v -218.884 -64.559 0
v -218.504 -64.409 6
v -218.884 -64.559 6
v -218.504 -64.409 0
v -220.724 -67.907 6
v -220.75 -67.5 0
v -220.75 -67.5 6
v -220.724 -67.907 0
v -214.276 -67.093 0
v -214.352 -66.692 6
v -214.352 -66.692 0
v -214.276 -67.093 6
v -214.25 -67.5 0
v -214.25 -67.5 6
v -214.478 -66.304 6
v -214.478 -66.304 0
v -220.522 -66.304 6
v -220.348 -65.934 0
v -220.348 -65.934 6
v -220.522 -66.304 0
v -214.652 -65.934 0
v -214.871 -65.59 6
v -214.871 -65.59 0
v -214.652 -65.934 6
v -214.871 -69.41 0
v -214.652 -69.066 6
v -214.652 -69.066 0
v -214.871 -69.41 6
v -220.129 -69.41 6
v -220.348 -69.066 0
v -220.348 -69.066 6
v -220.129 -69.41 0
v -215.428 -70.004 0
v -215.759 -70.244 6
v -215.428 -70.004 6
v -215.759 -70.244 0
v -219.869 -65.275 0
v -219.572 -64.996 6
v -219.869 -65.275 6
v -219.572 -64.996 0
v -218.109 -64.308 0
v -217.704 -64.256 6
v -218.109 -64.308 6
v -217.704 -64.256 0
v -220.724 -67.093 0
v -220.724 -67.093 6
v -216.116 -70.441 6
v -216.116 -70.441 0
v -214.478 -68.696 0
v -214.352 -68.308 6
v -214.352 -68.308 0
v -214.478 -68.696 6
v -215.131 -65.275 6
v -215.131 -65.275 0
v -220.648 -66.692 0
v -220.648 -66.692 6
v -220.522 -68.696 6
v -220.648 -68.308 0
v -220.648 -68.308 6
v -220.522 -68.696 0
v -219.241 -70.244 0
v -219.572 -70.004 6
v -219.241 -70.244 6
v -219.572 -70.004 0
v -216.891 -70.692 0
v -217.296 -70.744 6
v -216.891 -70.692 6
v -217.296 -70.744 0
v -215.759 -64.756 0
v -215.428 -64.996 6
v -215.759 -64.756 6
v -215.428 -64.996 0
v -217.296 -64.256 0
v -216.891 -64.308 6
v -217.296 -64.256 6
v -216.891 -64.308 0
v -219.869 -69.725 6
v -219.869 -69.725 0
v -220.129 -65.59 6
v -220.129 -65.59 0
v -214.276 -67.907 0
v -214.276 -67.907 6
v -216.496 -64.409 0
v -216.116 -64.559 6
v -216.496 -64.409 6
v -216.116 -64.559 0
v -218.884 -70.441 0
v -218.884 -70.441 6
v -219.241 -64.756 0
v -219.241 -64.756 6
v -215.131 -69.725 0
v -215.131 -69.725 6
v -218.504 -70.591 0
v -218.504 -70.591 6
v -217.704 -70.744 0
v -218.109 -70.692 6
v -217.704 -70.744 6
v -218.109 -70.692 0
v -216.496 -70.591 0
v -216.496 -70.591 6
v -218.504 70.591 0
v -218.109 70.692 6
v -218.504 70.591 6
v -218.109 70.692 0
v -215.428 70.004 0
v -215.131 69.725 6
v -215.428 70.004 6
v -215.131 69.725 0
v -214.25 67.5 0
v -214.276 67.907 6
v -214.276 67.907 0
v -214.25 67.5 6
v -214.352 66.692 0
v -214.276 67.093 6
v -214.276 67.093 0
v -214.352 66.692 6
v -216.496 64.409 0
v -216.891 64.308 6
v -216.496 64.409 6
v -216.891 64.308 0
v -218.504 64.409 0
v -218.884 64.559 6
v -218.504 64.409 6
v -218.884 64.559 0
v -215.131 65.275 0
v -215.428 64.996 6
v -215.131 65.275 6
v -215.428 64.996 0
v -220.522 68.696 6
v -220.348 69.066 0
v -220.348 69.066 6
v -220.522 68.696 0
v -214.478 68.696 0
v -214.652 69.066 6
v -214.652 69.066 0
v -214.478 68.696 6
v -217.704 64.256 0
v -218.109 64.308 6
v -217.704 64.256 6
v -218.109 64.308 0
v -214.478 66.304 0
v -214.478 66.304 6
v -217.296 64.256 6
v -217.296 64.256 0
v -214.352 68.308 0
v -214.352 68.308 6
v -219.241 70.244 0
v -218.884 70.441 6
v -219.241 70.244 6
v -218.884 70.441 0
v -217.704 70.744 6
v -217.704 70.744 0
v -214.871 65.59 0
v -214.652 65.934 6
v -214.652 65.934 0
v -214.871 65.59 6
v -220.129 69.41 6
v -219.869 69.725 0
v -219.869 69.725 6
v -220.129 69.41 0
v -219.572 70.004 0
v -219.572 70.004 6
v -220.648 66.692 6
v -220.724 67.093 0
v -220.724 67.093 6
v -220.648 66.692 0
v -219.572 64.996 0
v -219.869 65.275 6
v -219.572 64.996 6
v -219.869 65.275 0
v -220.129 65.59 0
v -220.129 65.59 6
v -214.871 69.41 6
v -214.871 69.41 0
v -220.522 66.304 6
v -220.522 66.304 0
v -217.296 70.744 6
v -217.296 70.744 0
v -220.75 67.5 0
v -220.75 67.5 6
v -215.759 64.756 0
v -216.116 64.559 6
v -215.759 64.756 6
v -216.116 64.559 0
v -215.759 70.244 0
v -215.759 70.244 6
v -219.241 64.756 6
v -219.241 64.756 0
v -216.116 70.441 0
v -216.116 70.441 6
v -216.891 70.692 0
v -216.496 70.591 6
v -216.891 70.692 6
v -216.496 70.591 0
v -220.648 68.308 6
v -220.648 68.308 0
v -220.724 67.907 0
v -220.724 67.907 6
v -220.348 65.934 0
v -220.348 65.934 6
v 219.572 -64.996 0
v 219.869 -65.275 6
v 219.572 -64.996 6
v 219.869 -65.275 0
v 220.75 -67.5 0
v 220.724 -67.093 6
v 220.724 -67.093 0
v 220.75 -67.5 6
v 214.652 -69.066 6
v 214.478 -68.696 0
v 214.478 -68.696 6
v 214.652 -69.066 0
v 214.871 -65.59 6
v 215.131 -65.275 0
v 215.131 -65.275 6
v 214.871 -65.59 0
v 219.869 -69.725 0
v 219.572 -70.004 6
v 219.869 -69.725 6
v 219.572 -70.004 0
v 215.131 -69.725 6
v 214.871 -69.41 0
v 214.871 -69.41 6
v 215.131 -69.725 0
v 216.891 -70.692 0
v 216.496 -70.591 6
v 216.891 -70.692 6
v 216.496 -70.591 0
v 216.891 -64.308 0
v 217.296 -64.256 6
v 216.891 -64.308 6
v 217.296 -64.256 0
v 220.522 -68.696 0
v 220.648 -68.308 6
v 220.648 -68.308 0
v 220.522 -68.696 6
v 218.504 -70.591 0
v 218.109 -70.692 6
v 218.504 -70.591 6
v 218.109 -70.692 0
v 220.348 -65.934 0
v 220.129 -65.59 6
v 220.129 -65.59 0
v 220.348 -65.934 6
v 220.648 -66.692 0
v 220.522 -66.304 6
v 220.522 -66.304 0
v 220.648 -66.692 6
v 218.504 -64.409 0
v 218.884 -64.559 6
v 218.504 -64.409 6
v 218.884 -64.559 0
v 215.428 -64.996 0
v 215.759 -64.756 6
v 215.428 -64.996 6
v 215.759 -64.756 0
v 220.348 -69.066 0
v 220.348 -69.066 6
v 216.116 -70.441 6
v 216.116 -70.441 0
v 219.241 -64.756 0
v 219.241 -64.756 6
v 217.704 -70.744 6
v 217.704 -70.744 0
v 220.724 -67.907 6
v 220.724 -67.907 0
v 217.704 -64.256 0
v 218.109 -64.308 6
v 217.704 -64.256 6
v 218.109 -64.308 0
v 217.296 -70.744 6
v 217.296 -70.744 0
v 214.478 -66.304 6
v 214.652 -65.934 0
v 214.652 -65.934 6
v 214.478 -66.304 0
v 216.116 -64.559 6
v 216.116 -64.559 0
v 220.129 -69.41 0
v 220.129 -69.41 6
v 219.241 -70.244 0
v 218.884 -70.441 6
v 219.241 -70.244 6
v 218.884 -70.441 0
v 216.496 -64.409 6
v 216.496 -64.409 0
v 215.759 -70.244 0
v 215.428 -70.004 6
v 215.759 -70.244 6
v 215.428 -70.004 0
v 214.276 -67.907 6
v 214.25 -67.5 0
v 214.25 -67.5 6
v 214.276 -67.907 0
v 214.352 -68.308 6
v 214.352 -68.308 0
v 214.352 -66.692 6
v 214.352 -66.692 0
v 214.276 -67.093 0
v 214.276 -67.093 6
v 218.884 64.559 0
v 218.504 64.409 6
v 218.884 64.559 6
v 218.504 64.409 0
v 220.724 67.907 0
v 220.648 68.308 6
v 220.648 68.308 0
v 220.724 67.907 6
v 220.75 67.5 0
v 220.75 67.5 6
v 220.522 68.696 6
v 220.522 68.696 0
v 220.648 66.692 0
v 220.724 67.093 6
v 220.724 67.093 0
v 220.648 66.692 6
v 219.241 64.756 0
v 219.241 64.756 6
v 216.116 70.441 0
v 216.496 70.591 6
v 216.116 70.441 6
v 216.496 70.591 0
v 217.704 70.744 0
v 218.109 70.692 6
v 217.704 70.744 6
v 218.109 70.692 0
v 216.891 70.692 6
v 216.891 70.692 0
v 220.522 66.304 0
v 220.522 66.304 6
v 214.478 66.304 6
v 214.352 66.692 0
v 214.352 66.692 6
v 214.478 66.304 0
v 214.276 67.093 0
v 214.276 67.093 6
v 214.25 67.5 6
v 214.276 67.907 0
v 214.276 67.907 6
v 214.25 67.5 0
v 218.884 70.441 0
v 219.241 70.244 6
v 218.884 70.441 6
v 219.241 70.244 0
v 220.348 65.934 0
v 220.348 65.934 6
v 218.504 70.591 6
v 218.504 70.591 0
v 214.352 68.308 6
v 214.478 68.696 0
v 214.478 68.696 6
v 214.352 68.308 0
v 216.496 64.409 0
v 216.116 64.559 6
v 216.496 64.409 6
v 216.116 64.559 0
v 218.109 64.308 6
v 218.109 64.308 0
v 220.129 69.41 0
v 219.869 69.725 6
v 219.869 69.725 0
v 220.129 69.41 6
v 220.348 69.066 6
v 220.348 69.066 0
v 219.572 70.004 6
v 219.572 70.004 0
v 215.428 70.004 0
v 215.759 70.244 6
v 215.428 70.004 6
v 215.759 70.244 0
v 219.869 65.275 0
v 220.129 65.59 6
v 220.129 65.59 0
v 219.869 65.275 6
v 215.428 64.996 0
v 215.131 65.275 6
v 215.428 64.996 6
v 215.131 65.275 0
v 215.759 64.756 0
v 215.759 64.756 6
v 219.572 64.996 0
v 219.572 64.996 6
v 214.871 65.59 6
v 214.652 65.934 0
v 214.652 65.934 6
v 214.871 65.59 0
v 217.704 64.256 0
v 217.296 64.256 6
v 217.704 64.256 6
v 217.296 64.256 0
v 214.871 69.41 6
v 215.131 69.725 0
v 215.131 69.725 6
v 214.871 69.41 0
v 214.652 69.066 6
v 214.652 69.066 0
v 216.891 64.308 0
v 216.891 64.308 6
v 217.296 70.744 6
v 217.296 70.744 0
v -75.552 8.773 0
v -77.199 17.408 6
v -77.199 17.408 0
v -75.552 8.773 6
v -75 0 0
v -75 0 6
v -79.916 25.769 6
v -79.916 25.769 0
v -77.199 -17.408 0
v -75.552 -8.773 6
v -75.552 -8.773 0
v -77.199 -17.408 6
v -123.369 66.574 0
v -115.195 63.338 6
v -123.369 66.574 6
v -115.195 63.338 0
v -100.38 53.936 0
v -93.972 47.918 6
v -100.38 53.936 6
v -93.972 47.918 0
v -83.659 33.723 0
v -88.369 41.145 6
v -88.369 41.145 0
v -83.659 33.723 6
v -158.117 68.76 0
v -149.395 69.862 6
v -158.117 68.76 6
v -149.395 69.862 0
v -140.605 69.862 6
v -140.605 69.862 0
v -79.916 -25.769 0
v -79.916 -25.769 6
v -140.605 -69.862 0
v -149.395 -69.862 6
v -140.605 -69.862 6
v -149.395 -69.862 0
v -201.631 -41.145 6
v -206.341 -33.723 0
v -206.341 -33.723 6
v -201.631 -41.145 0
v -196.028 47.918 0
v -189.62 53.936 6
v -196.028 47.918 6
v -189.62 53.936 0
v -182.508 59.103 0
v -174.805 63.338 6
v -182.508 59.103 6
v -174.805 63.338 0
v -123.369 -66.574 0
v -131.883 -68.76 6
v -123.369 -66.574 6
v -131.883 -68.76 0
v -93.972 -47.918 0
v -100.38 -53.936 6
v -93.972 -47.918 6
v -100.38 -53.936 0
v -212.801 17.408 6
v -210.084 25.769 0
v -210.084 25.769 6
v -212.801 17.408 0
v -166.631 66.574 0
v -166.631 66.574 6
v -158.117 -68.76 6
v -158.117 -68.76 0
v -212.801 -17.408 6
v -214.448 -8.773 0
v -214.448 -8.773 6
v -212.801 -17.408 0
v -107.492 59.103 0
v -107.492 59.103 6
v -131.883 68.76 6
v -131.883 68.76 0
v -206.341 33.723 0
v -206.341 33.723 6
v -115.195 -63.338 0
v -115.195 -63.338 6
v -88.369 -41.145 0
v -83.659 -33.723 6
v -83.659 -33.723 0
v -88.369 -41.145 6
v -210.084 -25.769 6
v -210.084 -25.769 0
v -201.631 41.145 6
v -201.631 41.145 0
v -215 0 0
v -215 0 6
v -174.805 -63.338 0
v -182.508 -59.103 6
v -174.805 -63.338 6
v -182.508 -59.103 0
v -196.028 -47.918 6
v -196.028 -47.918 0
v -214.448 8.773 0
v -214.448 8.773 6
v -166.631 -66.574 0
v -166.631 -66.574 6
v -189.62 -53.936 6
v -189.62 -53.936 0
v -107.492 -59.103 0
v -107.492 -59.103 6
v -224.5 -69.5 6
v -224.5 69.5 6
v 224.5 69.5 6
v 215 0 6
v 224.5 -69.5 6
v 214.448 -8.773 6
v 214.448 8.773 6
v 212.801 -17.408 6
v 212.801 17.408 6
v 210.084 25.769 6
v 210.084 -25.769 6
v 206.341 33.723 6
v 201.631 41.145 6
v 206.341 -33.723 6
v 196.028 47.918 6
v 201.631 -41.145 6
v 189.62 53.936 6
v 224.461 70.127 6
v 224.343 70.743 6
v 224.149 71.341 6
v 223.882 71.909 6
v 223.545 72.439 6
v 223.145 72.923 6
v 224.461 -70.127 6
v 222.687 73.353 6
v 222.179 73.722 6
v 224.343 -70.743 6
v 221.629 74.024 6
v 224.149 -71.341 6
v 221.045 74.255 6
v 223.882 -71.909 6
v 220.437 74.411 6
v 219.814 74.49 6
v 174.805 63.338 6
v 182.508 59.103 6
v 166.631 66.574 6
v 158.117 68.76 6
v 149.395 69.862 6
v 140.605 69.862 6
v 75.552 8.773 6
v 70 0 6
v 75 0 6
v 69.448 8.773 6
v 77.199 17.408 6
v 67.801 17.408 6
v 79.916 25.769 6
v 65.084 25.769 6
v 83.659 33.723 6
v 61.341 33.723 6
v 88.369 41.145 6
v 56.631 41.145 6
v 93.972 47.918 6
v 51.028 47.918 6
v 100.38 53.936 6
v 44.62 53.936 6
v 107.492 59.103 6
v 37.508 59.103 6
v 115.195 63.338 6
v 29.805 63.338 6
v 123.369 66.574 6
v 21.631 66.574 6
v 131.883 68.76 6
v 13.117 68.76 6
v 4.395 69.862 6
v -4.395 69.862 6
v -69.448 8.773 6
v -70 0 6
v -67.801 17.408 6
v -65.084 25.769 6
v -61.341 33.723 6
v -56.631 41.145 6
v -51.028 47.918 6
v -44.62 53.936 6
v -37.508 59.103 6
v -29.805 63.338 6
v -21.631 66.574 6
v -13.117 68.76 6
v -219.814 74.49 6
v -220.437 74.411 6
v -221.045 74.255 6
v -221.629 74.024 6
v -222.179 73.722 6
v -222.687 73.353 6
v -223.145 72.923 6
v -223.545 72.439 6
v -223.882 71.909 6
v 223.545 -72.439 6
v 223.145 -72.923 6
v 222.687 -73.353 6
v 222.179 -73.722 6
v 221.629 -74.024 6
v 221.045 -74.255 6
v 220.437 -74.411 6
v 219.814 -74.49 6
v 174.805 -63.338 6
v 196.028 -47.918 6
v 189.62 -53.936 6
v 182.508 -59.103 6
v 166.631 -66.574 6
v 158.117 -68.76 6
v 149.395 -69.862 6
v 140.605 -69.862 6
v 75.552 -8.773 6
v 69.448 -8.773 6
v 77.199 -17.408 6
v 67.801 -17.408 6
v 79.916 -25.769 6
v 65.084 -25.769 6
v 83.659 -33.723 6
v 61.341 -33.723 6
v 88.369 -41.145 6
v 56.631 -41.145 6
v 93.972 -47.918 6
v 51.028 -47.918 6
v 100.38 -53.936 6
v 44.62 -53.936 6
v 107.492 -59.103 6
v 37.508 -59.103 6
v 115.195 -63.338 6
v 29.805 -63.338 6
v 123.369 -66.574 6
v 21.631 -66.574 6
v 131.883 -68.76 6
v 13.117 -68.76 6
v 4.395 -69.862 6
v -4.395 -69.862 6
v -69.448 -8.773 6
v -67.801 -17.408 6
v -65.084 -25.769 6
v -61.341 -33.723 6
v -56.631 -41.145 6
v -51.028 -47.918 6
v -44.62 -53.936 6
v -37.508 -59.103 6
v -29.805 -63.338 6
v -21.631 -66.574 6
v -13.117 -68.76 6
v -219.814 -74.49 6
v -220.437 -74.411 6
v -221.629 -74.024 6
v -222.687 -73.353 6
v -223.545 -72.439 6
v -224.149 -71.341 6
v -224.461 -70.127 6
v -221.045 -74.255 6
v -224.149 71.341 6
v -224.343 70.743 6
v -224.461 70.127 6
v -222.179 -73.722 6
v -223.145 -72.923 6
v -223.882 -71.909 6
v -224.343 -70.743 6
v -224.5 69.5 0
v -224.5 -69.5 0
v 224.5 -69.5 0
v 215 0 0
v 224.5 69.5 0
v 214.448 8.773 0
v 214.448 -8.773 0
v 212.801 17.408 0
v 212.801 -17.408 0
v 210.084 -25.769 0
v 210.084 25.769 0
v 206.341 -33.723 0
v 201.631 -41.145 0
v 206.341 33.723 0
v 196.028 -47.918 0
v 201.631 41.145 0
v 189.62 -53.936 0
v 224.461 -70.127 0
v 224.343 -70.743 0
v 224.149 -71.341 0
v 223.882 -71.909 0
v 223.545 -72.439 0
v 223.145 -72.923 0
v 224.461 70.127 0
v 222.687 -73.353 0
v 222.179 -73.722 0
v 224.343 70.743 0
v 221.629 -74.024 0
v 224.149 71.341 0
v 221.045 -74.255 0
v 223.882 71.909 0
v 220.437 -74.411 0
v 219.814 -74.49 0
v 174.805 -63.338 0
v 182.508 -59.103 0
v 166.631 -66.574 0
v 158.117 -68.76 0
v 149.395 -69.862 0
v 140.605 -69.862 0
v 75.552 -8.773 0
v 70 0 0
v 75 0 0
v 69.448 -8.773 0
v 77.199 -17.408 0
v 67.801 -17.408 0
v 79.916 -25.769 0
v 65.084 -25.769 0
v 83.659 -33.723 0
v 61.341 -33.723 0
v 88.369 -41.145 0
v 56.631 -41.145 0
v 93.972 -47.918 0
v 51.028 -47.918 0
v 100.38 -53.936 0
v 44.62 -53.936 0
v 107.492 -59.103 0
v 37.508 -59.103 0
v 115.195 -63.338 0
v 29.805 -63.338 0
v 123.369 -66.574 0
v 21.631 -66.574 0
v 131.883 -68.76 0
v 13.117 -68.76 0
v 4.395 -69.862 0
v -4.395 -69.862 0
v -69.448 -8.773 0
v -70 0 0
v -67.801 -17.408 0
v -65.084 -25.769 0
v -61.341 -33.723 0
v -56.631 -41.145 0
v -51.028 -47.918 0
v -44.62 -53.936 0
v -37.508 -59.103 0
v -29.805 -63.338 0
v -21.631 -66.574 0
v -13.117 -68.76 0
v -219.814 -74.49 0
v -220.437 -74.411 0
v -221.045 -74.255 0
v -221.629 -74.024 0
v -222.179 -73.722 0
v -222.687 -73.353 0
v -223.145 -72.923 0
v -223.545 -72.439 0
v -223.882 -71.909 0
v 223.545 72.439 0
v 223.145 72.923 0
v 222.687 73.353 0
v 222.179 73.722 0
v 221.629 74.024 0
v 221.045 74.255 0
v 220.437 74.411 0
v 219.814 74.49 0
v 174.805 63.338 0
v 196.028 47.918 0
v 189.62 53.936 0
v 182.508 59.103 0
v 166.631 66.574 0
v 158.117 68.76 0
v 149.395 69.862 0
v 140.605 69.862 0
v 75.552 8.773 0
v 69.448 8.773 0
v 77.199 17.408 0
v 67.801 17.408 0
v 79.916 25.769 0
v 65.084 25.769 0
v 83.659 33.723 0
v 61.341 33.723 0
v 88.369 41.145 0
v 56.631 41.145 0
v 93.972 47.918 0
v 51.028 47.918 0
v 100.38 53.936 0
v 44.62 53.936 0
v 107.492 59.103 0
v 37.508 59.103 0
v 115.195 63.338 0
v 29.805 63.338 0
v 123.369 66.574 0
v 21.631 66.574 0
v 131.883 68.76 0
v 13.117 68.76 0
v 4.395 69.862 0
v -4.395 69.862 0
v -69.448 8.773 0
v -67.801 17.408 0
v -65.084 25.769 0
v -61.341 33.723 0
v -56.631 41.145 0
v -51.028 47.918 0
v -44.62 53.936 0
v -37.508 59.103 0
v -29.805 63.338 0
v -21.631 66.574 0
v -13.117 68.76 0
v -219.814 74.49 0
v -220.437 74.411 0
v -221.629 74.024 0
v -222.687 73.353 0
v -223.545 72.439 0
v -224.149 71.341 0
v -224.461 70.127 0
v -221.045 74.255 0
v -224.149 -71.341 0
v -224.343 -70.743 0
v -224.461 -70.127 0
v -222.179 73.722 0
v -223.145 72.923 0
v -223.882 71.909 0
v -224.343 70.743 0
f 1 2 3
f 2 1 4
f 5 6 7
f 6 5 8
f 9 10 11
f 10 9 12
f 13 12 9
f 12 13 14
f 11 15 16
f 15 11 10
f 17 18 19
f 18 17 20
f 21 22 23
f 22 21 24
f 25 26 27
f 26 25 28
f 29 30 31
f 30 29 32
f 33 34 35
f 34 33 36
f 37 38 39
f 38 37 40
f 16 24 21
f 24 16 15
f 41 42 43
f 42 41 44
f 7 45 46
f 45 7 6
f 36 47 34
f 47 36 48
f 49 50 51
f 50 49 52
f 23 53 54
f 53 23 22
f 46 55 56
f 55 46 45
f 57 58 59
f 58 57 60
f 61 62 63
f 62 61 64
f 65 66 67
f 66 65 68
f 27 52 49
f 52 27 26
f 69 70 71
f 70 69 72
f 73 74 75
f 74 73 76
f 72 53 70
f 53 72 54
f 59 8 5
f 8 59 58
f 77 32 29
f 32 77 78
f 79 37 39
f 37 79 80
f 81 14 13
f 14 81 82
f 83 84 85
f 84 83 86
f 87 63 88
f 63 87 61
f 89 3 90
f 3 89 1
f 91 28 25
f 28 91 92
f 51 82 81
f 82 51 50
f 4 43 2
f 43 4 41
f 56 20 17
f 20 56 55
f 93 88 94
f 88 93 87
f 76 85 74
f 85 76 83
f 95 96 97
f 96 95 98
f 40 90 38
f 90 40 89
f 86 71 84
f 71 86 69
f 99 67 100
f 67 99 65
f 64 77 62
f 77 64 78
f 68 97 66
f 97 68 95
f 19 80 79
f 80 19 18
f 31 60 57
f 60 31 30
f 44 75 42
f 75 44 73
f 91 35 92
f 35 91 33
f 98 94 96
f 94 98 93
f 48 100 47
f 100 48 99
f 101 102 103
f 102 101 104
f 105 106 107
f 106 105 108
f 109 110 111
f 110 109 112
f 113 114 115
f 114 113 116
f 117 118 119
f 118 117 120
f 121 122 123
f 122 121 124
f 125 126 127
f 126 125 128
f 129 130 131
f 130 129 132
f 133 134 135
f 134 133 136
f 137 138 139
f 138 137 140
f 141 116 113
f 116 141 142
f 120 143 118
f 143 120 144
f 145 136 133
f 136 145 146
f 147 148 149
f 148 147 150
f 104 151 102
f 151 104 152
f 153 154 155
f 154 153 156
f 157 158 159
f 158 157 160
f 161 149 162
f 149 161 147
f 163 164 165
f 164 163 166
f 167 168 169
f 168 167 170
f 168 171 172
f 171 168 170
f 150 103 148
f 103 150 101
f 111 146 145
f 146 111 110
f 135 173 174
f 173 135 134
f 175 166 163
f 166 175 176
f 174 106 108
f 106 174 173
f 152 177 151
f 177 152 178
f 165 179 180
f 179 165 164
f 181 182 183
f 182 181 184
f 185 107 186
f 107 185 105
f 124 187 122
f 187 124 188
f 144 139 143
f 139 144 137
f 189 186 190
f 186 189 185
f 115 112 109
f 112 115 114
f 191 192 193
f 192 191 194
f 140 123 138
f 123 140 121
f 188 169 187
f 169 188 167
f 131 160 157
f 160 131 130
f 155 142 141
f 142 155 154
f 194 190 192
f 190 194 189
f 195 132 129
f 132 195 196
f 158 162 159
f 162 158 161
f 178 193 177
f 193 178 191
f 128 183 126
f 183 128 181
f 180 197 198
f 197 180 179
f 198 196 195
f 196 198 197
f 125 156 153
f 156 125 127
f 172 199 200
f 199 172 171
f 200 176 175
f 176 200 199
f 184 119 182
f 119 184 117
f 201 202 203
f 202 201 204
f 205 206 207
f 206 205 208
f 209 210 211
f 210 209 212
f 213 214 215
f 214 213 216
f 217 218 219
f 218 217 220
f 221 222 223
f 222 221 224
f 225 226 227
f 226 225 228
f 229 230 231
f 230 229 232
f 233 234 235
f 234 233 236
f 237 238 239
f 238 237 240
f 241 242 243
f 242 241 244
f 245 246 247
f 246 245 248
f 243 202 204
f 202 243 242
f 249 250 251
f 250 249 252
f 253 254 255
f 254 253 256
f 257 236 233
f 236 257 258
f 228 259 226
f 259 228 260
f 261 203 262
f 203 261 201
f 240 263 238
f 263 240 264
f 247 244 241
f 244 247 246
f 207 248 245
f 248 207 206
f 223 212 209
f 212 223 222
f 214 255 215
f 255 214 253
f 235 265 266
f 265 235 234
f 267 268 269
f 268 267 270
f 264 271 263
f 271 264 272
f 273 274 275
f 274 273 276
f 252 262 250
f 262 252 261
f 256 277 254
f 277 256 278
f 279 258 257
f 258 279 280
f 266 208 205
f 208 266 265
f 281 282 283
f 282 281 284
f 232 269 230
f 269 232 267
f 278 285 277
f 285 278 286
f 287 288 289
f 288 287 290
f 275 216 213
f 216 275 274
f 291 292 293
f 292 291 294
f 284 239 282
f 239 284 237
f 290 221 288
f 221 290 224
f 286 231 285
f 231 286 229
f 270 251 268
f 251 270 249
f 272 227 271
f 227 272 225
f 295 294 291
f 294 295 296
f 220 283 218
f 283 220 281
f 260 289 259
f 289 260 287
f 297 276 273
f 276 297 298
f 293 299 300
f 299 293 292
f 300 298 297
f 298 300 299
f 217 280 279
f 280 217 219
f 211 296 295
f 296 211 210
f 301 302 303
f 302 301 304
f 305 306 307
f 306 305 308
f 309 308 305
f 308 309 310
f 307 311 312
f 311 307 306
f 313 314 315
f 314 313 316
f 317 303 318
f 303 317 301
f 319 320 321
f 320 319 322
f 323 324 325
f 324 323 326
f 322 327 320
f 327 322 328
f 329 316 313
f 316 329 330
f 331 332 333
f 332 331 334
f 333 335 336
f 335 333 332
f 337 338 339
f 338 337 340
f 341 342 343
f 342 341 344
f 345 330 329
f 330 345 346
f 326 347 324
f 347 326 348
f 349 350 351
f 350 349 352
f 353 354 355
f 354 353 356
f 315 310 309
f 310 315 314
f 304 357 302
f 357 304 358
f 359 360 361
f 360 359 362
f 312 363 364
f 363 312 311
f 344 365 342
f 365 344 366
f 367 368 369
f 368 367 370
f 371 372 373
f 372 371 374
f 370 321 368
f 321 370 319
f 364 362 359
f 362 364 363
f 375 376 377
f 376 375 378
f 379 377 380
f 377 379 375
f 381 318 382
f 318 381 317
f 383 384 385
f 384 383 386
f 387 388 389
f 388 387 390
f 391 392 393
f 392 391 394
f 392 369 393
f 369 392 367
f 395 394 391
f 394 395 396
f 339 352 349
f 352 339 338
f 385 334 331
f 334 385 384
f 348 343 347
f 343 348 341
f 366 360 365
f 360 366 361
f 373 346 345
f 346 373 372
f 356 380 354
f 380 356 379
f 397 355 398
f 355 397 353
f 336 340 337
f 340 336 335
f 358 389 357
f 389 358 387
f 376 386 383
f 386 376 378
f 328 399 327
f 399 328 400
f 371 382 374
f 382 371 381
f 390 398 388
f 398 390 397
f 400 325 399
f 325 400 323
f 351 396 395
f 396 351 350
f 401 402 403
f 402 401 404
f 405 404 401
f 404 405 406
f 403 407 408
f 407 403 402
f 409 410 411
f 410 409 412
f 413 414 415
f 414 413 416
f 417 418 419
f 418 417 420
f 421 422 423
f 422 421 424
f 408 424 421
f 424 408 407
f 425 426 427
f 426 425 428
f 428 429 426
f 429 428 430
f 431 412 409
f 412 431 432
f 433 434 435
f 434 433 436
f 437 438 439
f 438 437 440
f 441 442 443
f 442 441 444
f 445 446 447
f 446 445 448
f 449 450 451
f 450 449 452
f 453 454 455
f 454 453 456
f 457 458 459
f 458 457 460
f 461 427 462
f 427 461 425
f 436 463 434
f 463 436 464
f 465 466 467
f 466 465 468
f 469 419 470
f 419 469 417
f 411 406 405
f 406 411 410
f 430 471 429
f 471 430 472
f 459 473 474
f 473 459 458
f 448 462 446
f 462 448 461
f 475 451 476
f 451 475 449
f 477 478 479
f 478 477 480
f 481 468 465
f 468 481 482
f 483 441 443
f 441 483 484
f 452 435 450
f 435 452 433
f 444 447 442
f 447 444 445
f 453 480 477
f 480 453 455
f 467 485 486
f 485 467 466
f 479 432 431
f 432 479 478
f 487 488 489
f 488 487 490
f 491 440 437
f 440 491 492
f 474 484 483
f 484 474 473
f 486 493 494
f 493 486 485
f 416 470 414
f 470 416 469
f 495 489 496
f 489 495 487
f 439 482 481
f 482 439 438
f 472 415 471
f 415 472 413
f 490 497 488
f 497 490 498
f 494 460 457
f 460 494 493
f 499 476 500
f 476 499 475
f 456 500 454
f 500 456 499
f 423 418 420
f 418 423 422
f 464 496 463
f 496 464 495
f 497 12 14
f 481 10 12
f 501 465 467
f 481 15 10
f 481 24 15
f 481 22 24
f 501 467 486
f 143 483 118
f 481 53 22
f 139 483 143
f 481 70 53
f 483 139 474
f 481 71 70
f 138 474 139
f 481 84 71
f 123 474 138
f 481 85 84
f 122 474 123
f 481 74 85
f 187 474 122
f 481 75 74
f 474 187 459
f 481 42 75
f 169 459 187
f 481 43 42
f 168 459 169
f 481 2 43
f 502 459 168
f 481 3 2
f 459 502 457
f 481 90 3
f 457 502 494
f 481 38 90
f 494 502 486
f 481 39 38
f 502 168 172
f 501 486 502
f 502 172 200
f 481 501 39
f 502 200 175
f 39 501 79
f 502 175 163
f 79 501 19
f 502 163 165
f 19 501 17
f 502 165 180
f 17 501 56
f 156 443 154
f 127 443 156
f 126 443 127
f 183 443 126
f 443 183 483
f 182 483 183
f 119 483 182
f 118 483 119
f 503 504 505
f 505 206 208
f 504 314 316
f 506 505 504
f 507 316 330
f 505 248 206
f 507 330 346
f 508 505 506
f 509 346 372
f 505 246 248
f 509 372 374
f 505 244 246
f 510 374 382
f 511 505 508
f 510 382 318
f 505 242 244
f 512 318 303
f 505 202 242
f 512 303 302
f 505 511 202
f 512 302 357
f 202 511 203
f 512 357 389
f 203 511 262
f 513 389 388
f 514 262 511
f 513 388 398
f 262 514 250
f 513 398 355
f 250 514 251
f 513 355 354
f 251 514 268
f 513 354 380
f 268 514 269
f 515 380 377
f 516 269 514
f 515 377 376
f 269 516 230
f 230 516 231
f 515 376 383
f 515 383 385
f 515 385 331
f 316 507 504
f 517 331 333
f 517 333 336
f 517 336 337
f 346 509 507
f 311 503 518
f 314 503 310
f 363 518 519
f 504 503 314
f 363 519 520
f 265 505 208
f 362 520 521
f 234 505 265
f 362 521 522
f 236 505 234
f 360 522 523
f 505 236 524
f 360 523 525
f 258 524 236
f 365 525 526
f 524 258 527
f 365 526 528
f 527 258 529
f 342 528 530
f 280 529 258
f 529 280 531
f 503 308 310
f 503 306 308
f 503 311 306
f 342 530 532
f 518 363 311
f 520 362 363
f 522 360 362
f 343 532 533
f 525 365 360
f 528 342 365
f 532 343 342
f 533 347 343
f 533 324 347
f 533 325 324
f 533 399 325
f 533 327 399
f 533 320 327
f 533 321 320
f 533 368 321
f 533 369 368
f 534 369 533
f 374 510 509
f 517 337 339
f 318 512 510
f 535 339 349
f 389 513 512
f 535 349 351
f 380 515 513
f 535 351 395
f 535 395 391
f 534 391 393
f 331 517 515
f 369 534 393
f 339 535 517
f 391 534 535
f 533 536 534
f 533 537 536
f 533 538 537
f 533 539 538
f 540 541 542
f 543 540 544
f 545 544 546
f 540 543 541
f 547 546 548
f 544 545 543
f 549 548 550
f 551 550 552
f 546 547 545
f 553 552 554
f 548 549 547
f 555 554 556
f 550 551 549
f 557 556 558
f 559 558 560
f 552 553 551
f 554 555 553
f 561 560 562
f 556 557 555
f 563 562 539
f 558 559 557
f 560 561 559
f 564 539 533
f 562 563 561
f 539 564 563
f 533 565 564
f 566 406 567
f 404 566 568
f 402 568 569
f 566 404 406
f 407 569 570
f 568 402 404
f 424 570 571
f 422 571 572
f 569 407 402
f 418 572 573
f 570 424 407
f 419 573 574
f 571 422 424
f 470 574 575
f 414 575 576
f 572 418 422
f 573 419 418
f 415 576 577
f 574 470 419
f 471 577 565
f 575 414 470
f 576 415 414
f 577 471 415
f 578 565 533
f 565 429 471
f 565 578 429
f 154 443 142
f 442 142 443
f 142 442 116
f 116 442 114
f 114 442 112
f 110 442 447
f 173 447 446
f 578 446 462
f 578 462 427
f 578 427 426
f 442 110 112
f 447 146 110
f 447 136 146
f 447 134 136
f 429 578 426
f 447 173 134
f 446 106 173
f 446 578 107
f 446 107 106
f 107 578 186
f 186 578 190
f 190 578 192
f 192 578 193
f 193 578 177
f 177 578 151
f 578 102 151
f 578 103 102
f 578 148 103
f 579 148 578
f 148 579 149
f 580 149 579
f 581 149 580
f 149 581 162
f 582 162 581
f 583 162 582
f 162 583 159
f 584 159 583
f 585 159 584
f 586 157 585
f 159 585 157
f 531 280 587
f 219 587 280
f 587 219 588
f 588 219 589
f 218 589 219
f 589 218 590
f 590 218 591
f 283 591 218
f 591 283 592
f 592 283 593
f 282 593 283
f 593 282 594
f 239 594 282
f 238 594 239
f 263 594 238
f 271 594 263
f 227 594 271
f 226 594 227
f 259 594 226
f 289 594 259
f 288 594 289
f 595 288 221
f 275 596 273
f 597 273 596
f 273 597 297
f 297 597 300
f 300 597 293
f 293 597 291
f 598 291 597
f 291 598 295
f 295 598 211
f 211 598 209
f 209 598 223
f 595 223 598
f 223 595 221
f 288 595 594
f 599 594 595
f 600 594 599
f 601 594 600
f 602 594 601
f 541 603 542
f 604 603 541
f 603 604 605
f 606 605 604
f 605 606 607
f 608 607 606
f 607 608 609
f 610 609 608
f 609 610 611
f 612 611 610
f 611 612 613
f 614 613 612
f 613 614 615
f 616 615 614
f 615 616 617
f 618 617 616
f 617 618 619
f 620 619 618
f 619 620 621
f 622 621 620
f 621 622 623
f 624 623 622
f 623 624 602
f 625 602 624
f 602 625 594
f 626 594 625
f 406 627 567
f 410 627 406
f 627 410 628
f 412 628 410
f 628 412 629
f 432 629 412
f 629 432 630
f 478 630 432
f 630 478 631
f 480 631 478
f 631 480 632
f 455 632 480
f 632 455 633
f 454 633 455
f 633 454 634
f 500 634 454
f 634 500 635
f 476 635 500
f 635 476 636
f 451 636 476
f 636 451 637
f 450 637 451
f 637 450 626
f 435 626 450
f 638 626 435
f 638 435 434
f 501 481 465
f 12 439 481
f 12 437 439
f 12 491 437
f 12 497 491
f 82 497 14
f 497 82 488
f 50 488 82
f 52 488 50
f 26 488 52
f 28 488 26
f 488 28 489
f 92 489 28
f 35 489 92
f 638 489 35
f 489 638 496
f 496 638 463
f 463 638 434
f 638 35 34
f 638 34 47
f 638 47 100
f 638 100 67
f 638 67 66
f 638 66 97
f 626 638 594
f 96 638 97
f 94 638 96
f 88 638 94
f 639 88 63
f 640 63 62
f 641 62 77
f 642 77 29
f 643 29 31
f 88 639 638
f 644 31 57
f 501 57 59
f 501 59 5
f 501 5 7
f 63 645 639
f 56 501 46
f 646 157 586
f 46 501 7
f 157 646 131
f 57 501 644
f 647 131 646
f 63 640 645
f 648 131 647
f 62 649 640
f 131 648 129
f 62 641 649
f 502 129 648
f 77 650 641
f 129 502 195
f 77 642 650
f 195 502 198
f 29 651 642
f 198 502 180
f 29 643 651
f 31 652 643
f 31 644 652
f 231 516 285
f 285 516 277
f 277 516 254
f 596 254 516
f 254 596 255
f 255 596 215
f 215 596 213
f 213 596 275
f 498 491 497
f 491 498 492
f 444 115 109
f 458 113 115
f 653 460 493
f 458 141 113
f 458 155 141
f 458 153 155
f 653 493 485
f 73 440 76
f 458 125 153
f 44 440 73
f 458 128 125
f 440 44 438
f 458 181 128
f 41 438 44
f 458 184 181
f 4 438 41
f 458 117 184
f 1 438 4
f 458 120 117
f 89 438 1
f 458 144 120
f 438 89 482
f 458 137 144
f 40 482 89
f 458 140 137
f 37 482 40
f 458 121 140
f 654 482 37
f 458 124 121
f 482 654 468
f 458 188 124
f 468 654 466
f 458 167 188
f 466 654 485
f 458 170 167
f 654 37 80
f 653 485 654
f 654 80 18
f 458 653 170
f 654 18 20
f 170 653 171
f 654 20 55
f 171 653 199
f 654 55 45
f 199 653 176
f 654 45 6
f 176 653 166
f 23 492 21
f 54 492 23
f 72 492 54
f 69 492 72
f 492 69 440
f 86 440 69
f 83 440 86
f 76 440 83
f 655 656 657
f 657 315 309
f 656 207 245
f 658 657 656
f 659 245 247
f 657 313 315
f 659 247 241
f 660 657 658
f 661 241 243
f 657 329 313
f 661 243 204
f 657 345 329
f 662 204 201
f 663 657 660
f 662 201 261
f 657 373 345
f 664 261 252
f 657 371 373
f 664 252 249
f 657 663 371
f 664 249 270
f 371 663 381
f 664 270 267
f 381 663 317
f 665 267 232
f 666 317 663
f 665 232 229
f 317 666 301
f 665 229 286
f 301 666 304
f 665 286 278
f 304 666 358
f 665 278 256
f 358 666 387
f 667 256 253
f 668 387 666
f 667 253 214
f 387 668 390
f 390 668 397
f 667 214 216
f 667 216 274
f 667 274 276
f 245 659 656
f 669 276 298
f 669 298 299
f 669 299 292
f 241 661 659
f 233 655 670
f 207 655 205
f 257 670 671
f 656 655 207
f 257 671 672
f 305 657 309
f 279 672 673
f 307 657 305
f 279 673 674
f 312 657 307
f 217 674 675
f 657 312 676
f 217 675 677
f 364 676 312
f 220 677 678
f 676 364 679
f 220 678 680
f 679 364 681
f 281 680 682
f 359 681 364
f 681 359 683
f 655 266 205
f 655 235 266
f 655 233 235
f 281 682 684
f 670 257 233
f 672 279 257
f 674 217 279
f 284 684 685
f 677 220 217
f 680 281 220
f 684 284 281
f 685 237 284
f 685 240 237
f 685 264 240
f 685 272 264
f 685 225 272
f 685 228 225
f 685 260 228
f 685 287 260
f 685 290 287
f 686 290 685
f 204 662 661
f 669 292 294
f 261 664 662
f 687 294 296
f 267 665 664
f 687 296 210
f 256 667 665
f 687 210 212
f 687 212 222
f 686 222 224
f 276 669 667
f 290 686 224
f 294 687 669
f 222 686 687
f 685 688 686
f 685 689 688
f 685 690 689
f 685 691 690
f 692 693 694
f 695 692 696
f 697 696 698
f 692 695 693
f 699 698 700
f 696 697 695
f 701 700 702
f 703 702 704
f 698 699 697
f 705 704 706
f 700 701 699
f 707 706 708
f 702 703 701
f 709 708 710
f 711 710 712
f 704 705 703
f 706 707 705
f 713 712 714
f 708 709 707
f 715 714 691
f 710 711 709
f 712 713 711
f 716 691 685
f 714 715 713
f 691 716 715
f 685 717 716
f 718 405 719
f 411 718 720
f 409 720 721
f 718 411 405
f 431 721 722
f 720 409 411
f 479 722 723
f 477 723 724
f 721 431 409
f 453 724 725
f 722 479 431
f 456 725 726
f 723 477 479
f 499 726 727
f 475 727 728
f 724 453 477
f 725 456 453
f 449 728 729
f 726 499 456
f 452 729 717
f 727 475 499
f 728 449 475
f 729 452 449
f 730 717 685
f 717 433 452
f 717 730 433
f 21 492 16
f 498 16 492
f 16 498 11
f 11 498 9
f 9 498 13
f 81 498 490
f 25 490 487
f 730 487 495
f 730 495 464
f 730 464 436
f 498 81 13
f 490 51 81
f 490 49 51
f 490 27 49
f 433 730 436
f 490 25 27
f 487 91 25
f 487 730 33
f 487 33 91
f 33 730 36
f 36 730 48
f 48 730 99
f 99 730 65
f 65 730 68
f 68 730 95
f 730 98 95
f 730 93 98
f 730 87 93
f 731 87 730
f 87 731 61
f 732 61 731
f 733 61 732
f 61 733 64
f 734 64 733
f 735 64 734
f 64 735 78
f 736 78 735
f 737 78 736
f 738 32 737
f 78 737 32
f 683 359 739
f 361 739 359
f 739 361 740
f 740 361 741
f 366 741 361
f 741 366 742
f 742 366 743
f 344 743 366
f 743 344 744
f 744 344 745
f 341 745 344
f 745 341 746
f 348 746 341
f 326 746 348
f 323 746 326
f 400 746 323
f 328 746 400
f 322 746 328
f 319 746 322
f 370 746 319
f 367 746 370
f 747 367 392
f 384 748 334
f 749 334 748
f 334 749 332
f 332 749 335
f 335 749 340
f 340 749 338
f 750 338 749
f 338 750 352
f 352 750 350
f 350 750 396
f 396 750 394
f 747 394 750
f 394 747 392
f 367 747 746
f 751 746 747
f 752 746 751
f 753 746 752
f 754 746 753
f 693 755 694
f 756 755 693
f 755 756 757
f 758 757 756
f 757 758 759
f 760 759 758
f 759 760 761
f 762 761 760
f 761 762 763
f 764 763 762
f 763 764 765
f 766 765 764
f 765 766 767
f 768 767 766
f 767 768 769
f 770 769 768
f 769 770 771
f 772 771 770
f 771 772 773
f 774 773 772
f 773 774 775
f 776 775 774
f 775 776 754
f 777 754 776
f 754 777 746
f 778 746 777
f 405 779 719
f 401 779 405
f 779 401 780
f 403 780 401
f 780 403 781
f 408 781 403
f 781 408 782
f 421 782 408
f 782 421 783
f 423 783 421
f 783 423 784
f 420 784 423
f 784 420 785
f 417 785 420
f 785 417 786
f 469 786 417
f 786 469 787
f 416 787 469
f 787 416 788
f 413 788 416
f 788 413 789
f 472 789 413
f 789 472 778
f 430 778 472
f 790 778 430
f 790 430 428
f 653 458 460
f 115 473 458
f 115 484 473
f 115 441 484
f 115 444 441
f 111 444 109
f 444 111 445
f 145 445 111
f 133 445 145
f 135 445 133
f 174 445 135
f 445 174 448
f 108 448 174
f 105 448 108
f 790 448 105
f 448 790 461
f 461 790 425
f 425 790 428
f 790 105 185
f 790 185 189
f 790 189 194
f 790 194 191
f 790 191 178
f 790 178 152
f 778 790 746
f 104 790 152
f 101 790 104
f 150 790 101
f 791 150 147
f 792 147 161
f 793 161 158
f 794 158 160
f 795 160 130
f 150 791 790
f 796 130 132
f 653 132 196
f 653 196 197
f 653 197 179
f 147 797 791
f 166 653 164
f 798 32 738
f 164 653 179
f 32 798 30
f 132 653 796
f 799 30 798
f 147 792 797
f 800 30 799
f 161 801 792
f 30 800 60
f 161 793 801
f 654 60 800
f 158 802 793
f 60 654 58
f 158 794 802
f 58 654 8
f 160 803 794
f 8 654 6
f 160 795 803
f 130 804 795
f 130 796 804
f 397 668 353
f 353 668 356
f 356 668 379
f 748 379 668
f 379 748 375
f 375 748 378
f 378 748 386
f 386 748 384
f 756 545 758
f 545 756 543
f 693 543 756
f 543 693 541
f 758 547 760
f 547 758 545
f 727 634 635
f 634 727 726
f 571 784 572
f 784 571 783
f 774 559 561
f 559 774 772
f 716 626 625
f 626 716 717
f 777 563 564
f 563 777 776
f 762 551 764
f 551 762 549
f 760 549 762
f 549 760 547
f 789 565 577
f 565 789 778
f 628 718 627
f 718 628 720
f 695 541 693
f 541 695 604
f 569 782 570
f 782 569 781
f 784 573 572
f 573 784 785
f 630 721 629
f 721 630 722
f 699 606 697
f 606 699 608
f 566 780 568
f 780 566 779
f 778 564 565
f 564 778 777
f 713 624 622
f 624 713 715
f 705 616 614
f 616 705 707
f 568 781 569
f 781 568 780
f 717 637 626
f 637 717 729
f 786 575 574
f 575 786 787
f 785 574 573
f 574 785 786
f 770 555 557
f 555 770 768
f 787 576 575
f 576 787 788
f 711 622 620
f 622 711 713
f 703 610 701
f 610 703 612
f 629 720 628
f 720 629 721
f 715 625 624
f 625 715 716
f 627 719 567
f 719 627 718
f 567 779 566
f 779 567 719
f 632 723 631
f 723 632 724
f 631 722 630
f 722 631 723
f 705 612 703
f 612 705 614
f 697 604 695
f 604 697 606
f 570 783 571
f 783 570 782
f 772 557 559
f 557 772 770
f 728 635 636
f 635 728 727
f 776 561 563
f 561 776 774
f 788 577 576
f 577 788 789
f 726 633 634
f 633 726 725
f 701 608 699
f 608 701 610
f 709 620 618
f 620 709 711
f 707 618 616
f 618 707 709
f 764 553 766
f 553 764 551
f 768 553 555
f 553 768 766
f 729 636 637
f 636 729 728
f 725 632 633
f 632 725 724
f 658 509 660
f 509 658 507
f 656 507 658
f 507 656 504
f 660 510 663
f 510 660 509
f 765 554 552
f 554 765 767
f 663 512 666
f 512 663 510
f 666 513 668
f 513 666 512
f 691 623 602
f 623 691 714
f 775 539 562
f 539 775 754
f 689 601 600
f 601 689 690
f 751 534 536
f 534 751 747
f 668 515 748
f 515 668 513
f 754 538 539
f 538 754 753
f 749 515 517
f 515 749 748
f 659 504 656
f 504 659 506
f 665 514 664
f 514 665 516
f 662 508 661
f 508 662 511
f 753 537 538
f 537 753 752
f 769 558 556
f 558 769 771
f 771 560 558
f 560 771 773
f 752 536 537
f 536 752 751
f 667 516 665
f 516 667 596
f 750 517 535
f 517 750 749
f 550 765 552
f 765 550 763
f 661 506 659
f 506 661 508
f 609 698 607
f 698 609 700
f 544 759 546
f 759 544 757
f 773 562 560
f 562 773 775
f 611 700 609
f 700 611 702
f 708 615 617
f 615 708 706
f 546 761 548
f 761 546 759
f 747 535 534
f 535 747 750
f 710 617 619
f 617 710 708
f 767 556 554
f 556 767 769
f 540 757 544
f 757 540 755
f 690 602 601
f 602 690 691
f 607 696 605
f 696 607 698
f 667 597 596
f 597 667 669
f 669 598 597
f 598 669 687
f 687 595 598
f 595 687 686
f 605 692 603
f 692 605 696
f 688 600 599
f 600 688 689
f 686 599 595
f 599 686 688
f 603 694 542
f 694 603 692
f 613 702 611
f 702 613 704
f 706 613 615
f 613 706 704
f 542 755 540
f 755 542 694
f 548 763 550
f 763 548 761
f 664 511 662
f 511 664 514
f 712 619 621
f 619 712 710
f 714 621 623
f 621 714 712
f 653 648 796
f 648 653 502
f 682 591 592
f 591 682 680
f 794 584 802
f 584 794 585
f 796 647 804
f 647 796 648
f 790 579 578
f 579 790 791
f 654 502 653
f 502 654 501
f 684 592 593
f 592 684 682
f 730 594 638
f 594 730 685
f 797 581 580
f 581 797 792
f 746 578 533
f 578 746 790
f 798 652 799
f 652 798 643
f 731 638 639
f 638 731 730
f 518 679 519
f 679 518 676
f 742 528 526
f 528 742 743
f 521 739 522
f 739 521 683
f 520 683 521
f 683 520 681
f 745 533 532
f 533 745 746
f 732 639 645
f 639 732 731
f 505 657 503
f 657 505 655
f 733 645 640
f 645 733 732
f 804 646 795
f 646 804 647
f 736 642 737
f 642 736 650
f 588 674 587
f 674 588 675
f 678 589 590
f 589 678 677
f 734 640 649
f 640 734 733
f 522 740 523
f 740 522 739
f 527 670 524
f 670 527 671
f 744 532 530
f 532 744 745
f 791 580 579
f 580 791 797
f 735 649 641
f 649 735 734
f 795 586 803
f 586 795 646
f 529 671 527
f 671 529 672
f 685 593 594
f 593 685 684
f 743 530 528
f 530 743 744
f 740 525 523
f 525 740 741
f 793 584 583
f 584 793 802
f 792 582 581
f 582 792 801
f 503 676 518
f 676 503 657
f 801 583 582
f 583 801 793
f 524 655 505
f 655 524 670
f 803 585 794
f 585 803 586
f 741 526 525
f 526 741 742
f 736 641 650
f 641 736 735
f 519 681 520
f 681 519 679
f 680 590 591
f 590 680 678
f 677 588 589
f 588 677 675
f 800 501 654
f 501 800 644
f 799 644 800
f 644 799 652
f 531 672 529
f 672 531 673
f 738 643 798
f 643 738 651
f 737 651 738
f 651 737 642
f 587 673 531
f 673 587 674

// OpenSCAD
$fn = 50;


difference() {
	union() {
		hull() {
			translate(v = [-219.5000000000, 69.5000000000, 0]) {
				cylinder(h = 6, r = 5);
			}
			translate(v = [219.5000000000, 69.5000000000, 0]) {
				cylinder(h = 6, r = 5);
			}
			translate(v = [-219.5000000000, -69.5000000000, 0]) {
				cylinder(h = 6, r = 5);
			}
			translate(v = [219.5000000000, -69.5000000000, 0]) {
				cylinder(h = 6, r = 5);
			}
		}
	}
	union() {
		#translate(v = [-217.5000000000, -67.5000000000, -100.0000000000]) {
			cylinder(h = 200, r = 3.2500000000);
		}
		#translate(v = [-217.5000000000, 67.5000000000, -100.0000000000]) {
			cylinder(h = 200, r = 3.2500000000);
		}
		#translate(v = [217.5000000000, -67.5000000000, -100.0000000000]) {
			cylinder(h = 200, r = 3.2500000000);
		}
		#translate(v = [217.5000000000, 67.5000000000, -100.0000000000]) {
			cylinder(h = 200, r = 3.2500000000);
		}
		#translate(v = [-145.0000000000, 0, 0]) {
			cylinder(h = 6, r = 70.0000000000);
		}
		#cylinder(h = 6, r = 70.0000000000);
		#translate(v = [145.0000000000, 0, 0]) {
			cylinder(h = 6, r = 70.0000000000);
		}
	}
}
